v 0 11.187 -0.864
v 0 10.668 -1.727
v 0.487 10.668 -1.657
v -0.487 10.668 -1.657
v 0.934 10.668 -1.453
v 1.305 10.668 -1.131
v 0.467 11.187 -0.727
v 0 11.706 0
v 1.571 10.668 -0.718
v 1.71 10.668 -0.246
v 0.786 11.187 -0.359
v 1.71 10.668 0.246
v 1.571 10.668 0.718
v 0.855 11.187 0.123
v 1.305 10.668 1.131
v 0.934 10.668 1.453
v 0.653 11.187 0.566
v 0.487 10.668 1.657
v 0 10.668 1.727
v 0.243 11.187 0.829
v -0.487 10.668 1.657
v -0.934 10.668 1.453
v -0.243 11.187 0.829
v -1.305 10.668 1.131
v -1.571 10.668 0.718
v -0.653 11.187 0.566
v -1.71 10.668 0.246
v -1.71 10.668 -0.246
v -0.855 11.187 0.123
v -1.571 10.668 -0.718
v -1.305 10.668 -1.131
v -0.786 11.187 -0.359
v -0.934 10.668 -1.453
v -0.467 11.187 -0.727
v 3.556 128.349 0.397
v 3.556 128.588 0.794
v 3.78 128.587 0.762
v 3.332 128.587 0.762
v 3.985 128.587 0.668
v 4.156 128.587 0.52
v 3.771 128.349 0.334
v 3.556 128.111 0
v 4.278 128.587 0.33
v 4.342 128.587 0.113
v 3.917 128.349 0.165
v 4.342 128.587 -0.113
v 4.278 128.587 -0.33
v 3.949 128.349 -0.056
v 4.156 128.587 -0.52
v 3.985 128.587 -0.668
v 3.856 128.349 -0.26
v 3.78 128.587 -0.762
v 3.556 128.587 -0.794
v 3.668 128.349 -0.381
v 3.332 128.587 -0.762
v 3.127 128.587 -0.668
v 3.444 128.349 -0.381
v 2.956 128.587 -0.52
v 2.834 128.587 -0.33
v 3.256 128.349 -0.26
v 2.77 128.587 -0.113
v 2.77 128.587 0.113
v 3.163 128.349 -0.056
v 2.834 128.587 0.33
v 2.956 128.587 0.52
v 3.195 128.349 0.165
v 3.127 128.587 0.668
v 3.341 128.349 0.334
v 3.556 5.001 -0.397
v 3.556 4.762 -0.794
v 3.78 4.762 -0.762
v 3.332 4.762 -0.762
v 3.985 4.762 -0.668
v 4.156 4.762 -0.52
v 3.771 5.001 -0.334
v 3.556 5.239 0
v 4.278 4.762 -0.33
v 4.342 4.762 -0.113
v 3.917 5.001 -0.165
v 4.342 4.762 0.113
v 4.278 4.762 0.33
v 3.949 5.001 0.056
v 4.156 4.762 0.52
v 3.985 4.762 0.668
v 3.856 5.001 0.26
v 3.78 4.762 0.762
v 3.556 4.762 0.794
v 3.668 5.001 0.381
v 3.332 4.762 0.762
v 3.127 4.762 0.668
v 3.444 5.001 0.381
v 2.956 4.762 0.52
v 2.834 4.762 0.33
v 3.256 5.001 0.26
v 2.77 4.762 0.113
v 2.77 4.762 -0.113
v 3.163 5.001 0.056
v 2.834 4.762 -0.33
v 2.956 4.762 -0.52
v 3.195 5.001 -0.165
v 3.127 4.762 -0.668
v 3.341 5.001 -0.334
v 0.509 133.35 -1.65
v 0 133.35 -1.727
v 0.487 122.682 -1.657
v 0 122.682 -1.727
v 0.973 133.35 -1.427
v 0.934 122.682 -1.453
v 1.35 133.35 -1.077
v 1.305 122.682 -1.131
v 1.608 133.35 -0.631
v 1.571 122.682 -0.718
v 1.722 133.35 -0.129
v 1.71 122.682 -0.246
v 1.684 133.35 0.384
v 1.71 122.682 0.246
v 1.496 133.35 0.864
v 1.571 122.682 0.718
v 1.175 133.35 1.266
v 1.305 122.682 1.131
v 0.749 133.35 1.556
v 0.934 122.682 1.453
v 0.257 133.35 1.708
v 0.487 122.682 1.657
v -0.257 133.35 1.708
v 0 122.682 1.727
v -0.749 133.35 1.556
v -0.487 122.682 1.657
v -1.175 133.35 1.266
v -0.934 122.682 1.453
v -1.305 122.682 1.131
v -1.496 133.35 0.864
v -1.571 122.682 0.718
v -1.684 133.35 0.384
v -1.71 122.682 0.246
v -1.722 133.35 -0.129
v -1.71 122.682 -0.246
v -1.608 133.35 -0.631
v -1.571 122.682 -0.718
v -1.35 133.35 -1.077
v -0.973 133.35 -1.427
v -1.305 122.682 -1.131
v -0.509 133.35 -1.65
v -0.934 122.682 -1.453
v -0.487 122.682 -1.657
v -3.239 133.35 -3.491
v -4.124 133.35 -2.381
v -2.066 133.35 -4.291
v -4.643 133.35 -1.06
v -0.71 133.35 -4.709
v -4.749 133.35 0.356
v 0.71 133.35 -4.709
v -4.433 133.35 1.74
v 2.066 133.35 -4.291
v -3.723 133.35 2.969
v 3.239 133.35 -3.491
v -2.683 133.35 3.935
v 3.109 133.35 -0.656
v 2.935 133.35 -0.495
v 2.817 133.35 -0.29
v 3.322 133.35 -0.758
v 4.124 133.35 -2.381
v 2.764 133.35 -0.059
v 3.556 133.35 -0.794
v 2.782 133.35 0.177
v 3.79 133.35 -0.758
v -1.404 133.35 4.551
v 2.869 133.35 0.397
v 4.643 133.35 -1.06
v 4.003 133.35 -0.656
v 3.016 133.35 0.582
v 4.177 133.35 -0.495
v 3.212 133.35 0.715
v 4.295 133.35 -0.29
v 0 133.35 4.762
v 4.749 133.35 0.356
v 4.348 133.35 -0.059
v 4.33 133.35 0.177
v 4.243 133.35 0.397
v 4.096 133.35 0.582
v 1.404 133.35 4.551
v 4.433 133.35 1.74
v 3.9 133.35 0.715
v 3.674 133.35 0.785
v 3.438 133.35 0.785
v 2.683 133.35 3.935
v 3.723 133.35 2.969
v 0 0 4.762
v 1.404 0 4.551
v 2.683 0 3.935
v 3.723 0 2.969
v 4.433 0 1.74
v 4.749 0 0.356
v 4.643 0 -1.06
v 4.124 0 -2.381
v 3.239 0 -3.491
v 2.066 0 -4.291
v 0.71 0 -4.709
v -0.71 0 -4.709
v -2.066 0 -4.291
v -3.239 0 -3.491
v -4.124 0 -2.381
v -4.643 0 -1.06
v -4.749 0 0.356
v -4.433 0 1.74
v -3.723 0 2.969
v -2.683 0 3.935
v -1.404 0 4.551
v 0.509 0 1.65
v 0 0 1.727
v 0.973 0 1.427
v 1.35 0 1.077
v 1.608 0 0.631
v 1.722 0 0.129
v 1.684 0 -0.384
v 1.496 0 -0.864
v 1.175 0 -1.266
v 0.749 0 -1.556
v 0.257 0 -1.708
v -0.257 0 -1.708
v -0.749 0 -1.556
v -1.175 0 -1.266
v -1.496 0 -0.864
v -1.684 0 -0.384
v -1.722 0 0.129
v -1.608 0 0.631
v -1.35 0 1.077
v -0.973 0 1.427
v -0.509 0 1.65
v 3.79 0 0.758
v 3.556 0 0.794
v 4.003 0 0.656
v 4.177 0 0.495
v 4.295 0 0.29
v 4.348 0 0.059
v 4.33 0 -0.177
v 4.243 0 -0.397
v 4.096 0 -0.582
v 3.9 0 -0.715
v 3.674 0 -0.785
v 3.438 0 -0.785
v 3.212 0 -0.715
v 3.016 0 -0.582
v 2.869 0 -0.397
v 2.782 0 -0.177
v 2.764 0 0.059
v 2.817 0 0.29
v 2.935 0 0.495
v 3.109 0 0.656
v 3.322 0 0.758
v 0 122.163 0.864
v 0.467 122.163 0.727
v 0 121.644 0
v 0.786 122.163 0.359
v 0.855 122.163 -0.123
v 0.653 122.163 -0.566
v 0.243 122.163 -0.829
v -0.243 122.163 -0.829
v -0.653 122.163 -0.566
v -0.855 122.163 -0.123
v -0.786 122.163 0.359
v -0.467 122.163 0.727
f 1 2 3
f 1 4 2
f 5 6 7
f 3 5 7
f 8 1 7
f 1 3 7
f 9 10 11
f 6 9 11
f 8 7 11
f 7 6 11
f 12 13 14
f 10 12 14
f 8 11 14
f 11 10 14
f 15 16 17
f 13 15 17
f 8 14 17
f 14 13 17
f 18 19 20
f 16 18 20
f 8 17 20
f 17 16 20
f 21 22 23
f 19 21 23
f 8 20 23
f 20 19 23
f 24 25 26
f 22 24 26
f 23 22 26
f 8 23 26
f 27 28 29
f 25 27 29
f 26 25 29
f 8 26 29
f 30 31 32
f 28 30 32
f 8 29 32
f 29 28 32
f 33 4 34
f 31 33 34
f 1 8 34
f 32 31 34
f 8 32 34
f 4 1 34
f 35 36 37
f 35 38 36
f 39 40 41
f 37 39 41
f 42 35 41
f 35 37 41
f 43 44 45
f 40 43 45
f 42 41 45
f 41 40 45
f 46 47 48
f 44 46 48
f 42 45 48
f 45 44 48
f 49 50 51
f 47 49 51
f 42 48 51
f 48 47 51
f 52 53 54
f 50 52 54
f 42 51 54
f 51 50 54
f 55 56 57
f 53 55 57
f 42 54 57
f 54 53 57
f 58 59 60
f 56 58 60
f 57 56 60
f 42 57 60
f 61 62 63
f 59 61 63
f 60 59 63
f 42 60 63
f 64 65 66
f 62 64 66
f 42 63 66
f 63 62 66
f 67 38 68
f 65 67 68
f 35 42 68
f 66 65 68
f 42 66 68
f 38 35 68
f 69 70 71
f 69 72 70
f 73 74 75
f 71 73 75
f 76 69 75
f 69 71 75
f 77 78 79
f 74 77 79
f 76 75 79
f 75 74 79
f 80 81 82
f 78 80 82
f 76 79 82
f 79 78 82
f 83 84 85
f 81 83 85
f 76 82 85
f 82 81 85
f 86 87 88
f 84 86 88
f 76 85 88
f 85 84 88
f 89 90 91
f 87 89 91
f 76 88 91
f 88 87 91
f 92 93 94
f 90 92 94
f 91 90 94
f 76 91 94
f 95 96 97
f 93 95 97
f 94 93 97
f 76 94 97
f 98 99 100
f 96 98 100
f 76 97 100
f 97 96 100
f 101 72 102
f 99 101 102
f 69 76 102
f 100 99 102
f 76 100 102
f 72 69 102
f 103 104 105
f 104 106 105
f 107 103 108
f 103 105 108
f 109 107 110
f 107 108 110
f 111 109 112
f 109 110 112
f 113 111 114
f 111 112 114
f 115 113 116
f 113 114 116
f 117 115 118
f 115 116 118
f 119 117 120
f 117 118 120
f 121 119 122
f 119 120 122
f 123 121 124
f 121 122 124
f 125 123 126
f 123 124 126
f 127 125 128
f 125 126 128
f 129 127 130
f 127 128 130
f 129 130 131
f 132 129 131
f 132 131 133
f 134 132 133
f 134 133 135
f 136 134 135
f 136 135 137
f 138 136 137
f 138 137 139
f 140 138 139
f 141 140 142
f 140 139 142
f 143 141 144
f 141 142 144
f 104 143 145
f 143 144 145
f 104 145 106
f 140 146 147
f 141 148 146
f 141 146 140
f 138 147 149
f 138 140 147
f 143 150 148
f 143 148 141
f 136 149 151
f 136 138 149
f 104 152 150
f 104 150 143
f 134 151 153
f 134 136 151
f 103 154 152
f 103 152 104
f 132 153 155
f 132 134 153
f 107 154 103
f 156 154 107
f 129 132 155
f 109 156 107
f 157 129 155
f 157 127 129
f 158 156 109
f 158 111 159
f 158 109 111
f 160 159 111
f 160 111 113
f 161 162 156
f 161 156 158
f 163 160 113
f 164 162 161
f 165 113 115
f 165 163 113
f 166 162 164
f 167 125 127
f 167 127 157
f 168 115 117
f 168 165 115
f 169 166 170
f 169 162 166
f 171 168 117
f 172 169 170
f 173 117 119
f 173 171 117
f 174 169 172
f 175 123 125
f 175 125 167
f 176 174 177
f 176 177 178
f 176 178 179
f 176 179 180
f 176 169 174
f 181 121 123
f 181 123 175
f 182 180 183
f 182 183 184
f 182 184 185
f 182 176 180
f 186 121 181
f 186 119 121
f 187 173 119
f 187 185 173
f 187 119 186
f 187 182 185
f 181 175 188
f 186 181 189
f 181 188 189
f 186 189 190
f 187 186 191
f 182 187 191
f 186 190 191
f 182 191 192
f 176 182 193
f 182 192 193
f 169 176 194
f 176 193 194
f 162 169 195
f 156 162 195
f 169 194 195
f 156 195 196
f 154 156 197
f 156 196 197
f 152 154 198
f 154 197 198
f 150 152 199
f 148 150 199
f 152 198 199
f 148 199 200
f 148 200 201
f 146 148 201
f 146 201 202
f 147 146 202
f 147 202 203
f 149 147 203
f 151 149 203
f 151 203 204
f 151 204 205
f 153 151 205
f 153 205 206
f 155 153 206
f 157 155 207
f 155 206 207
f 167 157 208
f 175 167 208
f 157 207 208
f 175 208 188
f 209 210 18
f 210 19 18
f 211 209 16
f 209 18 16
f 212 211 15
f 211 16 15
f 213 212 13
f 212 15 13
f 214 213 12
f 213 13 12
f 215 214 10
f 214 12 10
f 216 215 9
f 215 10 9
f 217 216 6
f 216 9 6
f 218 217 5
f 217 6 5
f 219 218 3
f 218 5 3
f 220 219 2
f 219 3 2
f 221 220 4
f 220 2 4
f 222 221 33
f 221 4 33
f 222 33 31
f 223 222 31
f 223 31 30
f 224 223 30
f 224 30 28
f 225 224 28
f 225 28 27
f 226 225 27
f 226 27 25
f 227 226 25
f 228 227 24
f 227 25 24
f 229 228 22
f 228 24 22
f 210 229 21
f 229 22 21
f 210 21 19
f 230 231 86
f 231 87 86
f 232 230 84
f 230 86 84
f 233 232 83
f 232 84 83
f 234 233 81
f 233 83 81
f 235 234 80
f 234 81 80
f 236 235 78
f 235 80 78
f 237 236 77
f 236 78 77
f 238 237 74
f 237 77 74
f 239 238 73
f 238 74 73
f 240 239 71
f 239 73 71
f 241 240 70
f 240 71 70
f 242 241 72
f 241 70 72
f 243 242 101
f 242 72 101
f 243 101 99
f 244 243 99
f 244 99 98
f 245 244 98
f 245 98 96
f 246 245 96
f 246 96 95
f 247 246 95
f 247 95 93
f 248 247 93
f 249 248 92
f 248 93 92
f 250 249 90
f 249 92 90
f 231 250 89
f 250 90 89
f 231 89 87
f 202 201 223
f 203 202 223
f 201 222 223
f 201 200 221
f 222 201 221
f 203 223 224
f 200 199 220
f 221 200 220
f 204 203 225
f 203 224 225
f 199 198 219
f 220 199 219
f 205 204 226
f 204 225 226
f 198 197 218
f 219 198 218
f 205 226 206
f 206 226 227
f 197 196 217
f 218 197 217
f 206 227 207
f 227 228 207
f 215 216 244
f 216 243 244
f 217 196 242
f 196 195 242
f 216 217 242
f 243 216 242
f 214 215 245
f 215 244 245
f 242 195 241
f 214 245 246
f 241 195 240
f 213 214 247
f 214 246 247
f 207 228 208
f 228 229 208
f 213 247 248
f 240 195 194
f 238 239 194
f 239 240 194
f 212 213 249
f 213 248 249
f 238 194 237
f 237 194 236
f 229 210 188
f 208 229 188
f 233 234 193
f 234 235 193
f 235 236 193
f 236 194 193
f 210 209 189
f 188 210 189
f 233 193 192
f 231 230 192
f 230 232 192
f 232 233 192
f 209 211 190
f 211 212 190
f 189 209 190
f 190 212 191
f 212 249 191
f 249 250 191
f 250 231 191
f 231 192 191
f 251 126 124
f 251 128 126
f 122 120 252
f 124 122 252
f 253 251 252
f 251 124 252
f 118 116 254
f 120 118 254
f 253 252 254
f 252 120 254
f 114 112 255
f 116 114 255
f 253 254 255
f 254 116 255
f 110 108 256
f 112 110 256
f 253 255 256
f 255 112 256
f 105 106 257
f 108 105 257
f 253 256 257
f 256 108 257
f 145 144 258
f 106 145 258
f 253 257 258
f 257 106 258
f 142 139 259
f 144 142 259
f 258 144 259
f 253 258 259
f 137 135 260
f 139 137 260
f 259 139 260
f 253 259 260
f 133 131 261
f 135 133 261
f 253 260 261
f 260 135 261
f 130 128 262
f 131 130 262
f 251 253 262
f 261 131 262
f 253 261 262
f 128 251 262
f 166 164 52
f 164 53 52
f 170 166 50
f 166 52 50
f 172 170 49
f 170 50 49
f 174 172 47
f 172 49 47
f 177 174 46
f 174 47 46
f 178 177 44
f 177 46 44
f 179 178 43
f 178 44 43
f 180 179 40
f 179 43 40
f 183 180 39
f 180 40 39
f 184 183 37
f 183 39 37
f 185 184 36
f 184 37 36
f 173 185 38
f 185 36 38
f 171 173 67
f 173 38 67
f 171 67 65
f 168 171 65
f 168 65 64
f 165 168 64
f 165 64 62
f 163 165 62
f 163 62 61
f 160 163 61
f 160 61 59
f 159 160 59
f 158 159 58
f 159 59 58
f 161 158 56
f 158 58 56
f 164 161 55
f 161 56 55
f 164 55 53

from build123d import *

# Parameters (mm, degrees)
SKETCH1_R                                    = 4.7625
BOSS_EXTRUDE1_DEPTH                          = 133.35
F_8_32_TAPPED_HOLE1_D                        = 3.4544
F_8_32_TAPPED_HOLE1_DEPTH                    = 10.668
F_8_32_TAPPED_HOLE1_TIP                      = 1.037806461
F_8_32_TAPPED_HOLE1_ON_FACE_2_D              = 3.4544
F_8_32_TAPPED_HOLE1_ON_FACE_2_DEPTH          = 10.668
F_8_32_TAPPED_HOLE1_ON_FACE_2_TIP            = 1.037806461
F_1_16_0_0625_DIAMETER_HOLE1_D               = 1.5875
F_1_16_0_0625_DIAMETER_HOLE1_DEPTH           = 4.7625
F_1_16_0_0625_DIAMETER_HOLE1_TIP             = 0.476933116
F_1_16_0_0625_DIAMETER_HOLE1_ON_FACE_2_D     = 1.5875
F_1_16_0_0625_DIAMETER_HOLE1_ON_FACE_2_DEPTH = 4.7625
F_1_16_0_0625_DIAMETER_HOLE1_ON_FACE_2_TIP   = 0.476933116


with BuildPart() as part:
    # Sketch1 → Boss-Extrude1 (new body)
    with BuildSketch(Plane(origin=(0, 0, 0), x_dir=(1, 0, 0), z_dir=(0, 1, 0))):
        with Locations(Location((0, 0, 0), (0, 0, 270))):
            Circle(SKETCH1_R)
    extrude(amount=BOSS_EXTRUDE1_DEPTH)

    # #8-32 Tapped Hole1
    with Locations(Plane.ZX.offset(133.35)):
        with Locations((0, 0)):
            Hole(F_8_32_TAPPED_HOLE1_D / 2, depth=F_8_32_TAPPED_HOLE1_DEPTH)
            with Locations((0, 0, -(F_8_32_TAPPED_HOLE1_DEPTH + F_8_32_TAPPED_HOLE1_TIP / 2))):  # 118° drill point
                Cone(0, F_8_32_TAPPED_HOLE1_D / 2, F_8_32_TAPPED_HOLE1_TIP, mode=Mode.SUBTRACT)

    # #8-32 Tapped Hole1 on face 2
    with Locations(Plane(origin=(0, 0, 0), x_dir=(0, 0, -1), z_dir=(0, -1, 0))):
        with Locations((0, 0)):
            Hole(F_8_32_TAPPED_HOLE1_ON_FACE_2_D / 2, depth=F_8_32_TAPPED_HOLE1_ON_FACE_2_DEPTH)
            with Locations((0, 0, -(F_8_32_TAPPED_HOLE1_ON_FACE_2_DEPTH + F_8_32_TAPPED_HOLE1_ON_FACE_2_TIP / 2))):  # 118° drill point
                Cone(0, F_8_32_TAPPED_HOLE1_ON_FACE_2_D / 2, F_8_32_TAPPED_HOLE1_ON_FACE_2_TIP, mode=Mode.SUBTRACT)

    # 1/16 (0.0625) Diameter Hole1
    with Locations(Plane(origin=(3.556, 0, 0), x_dir=(0, 0, -1), z_dir=(0, -1, 0))):
        with Locations((0, 0)):
            Hole(F_1_16_0_0625_DIAMETER_HOLE1_D / 2, depth=F_1_16_0_0625_DIAMETER_HOLE1_DEPTH)
            with Locations((0, 0, -(F_1_16_0_0625_DIAMETER_HOLE1_DEPTH + F_1_16_0_0625_DIAMETER_HOLE1_TIP / 2))):  # 118° drill point
                Cone(0, F_1_16_0_0625_DIAMETER_HOLE1_D / 2, F_1_16_0_0625_DIAMETER_HOLE1_TIP, mode=Mode.SUBTRACT)

    # 1/16 (0.0625) Diameter Hole1 on face 2
    with Locations(Plane(origin=(3.556, 133.35, 0), x_dir=(0, 0, 1), z_dir=(0, 1, 0))):
        with Locations((0, 0)):
            Hole(F_1_16_0_0625_DIAMETER_HOLE1_ON_FACE_2_D / 2, depth=F_1_16_0_0625_DIAMETER_HOLE1_ON_FACE_2_DEPTH)
            with Locations((0, 0, -(F_1_16_0_0625_DIAMETER_HOLE1_ON_FACE_2_DEPTH + F_1_16_0_0625_DIAMETER_HOLE1_ON_FACE_2_TIP / 2))):  # 118° drill point
                Cone(0, F_1_16_0_0625_DIAMETER_HOLE1_ON_FACE_2_D / 2, F_1_16_0_0625_DIAMETER_HOLE1_ON_FACE_2_TIP, mode=Mode.SUBTRACT)


solid = part.part
